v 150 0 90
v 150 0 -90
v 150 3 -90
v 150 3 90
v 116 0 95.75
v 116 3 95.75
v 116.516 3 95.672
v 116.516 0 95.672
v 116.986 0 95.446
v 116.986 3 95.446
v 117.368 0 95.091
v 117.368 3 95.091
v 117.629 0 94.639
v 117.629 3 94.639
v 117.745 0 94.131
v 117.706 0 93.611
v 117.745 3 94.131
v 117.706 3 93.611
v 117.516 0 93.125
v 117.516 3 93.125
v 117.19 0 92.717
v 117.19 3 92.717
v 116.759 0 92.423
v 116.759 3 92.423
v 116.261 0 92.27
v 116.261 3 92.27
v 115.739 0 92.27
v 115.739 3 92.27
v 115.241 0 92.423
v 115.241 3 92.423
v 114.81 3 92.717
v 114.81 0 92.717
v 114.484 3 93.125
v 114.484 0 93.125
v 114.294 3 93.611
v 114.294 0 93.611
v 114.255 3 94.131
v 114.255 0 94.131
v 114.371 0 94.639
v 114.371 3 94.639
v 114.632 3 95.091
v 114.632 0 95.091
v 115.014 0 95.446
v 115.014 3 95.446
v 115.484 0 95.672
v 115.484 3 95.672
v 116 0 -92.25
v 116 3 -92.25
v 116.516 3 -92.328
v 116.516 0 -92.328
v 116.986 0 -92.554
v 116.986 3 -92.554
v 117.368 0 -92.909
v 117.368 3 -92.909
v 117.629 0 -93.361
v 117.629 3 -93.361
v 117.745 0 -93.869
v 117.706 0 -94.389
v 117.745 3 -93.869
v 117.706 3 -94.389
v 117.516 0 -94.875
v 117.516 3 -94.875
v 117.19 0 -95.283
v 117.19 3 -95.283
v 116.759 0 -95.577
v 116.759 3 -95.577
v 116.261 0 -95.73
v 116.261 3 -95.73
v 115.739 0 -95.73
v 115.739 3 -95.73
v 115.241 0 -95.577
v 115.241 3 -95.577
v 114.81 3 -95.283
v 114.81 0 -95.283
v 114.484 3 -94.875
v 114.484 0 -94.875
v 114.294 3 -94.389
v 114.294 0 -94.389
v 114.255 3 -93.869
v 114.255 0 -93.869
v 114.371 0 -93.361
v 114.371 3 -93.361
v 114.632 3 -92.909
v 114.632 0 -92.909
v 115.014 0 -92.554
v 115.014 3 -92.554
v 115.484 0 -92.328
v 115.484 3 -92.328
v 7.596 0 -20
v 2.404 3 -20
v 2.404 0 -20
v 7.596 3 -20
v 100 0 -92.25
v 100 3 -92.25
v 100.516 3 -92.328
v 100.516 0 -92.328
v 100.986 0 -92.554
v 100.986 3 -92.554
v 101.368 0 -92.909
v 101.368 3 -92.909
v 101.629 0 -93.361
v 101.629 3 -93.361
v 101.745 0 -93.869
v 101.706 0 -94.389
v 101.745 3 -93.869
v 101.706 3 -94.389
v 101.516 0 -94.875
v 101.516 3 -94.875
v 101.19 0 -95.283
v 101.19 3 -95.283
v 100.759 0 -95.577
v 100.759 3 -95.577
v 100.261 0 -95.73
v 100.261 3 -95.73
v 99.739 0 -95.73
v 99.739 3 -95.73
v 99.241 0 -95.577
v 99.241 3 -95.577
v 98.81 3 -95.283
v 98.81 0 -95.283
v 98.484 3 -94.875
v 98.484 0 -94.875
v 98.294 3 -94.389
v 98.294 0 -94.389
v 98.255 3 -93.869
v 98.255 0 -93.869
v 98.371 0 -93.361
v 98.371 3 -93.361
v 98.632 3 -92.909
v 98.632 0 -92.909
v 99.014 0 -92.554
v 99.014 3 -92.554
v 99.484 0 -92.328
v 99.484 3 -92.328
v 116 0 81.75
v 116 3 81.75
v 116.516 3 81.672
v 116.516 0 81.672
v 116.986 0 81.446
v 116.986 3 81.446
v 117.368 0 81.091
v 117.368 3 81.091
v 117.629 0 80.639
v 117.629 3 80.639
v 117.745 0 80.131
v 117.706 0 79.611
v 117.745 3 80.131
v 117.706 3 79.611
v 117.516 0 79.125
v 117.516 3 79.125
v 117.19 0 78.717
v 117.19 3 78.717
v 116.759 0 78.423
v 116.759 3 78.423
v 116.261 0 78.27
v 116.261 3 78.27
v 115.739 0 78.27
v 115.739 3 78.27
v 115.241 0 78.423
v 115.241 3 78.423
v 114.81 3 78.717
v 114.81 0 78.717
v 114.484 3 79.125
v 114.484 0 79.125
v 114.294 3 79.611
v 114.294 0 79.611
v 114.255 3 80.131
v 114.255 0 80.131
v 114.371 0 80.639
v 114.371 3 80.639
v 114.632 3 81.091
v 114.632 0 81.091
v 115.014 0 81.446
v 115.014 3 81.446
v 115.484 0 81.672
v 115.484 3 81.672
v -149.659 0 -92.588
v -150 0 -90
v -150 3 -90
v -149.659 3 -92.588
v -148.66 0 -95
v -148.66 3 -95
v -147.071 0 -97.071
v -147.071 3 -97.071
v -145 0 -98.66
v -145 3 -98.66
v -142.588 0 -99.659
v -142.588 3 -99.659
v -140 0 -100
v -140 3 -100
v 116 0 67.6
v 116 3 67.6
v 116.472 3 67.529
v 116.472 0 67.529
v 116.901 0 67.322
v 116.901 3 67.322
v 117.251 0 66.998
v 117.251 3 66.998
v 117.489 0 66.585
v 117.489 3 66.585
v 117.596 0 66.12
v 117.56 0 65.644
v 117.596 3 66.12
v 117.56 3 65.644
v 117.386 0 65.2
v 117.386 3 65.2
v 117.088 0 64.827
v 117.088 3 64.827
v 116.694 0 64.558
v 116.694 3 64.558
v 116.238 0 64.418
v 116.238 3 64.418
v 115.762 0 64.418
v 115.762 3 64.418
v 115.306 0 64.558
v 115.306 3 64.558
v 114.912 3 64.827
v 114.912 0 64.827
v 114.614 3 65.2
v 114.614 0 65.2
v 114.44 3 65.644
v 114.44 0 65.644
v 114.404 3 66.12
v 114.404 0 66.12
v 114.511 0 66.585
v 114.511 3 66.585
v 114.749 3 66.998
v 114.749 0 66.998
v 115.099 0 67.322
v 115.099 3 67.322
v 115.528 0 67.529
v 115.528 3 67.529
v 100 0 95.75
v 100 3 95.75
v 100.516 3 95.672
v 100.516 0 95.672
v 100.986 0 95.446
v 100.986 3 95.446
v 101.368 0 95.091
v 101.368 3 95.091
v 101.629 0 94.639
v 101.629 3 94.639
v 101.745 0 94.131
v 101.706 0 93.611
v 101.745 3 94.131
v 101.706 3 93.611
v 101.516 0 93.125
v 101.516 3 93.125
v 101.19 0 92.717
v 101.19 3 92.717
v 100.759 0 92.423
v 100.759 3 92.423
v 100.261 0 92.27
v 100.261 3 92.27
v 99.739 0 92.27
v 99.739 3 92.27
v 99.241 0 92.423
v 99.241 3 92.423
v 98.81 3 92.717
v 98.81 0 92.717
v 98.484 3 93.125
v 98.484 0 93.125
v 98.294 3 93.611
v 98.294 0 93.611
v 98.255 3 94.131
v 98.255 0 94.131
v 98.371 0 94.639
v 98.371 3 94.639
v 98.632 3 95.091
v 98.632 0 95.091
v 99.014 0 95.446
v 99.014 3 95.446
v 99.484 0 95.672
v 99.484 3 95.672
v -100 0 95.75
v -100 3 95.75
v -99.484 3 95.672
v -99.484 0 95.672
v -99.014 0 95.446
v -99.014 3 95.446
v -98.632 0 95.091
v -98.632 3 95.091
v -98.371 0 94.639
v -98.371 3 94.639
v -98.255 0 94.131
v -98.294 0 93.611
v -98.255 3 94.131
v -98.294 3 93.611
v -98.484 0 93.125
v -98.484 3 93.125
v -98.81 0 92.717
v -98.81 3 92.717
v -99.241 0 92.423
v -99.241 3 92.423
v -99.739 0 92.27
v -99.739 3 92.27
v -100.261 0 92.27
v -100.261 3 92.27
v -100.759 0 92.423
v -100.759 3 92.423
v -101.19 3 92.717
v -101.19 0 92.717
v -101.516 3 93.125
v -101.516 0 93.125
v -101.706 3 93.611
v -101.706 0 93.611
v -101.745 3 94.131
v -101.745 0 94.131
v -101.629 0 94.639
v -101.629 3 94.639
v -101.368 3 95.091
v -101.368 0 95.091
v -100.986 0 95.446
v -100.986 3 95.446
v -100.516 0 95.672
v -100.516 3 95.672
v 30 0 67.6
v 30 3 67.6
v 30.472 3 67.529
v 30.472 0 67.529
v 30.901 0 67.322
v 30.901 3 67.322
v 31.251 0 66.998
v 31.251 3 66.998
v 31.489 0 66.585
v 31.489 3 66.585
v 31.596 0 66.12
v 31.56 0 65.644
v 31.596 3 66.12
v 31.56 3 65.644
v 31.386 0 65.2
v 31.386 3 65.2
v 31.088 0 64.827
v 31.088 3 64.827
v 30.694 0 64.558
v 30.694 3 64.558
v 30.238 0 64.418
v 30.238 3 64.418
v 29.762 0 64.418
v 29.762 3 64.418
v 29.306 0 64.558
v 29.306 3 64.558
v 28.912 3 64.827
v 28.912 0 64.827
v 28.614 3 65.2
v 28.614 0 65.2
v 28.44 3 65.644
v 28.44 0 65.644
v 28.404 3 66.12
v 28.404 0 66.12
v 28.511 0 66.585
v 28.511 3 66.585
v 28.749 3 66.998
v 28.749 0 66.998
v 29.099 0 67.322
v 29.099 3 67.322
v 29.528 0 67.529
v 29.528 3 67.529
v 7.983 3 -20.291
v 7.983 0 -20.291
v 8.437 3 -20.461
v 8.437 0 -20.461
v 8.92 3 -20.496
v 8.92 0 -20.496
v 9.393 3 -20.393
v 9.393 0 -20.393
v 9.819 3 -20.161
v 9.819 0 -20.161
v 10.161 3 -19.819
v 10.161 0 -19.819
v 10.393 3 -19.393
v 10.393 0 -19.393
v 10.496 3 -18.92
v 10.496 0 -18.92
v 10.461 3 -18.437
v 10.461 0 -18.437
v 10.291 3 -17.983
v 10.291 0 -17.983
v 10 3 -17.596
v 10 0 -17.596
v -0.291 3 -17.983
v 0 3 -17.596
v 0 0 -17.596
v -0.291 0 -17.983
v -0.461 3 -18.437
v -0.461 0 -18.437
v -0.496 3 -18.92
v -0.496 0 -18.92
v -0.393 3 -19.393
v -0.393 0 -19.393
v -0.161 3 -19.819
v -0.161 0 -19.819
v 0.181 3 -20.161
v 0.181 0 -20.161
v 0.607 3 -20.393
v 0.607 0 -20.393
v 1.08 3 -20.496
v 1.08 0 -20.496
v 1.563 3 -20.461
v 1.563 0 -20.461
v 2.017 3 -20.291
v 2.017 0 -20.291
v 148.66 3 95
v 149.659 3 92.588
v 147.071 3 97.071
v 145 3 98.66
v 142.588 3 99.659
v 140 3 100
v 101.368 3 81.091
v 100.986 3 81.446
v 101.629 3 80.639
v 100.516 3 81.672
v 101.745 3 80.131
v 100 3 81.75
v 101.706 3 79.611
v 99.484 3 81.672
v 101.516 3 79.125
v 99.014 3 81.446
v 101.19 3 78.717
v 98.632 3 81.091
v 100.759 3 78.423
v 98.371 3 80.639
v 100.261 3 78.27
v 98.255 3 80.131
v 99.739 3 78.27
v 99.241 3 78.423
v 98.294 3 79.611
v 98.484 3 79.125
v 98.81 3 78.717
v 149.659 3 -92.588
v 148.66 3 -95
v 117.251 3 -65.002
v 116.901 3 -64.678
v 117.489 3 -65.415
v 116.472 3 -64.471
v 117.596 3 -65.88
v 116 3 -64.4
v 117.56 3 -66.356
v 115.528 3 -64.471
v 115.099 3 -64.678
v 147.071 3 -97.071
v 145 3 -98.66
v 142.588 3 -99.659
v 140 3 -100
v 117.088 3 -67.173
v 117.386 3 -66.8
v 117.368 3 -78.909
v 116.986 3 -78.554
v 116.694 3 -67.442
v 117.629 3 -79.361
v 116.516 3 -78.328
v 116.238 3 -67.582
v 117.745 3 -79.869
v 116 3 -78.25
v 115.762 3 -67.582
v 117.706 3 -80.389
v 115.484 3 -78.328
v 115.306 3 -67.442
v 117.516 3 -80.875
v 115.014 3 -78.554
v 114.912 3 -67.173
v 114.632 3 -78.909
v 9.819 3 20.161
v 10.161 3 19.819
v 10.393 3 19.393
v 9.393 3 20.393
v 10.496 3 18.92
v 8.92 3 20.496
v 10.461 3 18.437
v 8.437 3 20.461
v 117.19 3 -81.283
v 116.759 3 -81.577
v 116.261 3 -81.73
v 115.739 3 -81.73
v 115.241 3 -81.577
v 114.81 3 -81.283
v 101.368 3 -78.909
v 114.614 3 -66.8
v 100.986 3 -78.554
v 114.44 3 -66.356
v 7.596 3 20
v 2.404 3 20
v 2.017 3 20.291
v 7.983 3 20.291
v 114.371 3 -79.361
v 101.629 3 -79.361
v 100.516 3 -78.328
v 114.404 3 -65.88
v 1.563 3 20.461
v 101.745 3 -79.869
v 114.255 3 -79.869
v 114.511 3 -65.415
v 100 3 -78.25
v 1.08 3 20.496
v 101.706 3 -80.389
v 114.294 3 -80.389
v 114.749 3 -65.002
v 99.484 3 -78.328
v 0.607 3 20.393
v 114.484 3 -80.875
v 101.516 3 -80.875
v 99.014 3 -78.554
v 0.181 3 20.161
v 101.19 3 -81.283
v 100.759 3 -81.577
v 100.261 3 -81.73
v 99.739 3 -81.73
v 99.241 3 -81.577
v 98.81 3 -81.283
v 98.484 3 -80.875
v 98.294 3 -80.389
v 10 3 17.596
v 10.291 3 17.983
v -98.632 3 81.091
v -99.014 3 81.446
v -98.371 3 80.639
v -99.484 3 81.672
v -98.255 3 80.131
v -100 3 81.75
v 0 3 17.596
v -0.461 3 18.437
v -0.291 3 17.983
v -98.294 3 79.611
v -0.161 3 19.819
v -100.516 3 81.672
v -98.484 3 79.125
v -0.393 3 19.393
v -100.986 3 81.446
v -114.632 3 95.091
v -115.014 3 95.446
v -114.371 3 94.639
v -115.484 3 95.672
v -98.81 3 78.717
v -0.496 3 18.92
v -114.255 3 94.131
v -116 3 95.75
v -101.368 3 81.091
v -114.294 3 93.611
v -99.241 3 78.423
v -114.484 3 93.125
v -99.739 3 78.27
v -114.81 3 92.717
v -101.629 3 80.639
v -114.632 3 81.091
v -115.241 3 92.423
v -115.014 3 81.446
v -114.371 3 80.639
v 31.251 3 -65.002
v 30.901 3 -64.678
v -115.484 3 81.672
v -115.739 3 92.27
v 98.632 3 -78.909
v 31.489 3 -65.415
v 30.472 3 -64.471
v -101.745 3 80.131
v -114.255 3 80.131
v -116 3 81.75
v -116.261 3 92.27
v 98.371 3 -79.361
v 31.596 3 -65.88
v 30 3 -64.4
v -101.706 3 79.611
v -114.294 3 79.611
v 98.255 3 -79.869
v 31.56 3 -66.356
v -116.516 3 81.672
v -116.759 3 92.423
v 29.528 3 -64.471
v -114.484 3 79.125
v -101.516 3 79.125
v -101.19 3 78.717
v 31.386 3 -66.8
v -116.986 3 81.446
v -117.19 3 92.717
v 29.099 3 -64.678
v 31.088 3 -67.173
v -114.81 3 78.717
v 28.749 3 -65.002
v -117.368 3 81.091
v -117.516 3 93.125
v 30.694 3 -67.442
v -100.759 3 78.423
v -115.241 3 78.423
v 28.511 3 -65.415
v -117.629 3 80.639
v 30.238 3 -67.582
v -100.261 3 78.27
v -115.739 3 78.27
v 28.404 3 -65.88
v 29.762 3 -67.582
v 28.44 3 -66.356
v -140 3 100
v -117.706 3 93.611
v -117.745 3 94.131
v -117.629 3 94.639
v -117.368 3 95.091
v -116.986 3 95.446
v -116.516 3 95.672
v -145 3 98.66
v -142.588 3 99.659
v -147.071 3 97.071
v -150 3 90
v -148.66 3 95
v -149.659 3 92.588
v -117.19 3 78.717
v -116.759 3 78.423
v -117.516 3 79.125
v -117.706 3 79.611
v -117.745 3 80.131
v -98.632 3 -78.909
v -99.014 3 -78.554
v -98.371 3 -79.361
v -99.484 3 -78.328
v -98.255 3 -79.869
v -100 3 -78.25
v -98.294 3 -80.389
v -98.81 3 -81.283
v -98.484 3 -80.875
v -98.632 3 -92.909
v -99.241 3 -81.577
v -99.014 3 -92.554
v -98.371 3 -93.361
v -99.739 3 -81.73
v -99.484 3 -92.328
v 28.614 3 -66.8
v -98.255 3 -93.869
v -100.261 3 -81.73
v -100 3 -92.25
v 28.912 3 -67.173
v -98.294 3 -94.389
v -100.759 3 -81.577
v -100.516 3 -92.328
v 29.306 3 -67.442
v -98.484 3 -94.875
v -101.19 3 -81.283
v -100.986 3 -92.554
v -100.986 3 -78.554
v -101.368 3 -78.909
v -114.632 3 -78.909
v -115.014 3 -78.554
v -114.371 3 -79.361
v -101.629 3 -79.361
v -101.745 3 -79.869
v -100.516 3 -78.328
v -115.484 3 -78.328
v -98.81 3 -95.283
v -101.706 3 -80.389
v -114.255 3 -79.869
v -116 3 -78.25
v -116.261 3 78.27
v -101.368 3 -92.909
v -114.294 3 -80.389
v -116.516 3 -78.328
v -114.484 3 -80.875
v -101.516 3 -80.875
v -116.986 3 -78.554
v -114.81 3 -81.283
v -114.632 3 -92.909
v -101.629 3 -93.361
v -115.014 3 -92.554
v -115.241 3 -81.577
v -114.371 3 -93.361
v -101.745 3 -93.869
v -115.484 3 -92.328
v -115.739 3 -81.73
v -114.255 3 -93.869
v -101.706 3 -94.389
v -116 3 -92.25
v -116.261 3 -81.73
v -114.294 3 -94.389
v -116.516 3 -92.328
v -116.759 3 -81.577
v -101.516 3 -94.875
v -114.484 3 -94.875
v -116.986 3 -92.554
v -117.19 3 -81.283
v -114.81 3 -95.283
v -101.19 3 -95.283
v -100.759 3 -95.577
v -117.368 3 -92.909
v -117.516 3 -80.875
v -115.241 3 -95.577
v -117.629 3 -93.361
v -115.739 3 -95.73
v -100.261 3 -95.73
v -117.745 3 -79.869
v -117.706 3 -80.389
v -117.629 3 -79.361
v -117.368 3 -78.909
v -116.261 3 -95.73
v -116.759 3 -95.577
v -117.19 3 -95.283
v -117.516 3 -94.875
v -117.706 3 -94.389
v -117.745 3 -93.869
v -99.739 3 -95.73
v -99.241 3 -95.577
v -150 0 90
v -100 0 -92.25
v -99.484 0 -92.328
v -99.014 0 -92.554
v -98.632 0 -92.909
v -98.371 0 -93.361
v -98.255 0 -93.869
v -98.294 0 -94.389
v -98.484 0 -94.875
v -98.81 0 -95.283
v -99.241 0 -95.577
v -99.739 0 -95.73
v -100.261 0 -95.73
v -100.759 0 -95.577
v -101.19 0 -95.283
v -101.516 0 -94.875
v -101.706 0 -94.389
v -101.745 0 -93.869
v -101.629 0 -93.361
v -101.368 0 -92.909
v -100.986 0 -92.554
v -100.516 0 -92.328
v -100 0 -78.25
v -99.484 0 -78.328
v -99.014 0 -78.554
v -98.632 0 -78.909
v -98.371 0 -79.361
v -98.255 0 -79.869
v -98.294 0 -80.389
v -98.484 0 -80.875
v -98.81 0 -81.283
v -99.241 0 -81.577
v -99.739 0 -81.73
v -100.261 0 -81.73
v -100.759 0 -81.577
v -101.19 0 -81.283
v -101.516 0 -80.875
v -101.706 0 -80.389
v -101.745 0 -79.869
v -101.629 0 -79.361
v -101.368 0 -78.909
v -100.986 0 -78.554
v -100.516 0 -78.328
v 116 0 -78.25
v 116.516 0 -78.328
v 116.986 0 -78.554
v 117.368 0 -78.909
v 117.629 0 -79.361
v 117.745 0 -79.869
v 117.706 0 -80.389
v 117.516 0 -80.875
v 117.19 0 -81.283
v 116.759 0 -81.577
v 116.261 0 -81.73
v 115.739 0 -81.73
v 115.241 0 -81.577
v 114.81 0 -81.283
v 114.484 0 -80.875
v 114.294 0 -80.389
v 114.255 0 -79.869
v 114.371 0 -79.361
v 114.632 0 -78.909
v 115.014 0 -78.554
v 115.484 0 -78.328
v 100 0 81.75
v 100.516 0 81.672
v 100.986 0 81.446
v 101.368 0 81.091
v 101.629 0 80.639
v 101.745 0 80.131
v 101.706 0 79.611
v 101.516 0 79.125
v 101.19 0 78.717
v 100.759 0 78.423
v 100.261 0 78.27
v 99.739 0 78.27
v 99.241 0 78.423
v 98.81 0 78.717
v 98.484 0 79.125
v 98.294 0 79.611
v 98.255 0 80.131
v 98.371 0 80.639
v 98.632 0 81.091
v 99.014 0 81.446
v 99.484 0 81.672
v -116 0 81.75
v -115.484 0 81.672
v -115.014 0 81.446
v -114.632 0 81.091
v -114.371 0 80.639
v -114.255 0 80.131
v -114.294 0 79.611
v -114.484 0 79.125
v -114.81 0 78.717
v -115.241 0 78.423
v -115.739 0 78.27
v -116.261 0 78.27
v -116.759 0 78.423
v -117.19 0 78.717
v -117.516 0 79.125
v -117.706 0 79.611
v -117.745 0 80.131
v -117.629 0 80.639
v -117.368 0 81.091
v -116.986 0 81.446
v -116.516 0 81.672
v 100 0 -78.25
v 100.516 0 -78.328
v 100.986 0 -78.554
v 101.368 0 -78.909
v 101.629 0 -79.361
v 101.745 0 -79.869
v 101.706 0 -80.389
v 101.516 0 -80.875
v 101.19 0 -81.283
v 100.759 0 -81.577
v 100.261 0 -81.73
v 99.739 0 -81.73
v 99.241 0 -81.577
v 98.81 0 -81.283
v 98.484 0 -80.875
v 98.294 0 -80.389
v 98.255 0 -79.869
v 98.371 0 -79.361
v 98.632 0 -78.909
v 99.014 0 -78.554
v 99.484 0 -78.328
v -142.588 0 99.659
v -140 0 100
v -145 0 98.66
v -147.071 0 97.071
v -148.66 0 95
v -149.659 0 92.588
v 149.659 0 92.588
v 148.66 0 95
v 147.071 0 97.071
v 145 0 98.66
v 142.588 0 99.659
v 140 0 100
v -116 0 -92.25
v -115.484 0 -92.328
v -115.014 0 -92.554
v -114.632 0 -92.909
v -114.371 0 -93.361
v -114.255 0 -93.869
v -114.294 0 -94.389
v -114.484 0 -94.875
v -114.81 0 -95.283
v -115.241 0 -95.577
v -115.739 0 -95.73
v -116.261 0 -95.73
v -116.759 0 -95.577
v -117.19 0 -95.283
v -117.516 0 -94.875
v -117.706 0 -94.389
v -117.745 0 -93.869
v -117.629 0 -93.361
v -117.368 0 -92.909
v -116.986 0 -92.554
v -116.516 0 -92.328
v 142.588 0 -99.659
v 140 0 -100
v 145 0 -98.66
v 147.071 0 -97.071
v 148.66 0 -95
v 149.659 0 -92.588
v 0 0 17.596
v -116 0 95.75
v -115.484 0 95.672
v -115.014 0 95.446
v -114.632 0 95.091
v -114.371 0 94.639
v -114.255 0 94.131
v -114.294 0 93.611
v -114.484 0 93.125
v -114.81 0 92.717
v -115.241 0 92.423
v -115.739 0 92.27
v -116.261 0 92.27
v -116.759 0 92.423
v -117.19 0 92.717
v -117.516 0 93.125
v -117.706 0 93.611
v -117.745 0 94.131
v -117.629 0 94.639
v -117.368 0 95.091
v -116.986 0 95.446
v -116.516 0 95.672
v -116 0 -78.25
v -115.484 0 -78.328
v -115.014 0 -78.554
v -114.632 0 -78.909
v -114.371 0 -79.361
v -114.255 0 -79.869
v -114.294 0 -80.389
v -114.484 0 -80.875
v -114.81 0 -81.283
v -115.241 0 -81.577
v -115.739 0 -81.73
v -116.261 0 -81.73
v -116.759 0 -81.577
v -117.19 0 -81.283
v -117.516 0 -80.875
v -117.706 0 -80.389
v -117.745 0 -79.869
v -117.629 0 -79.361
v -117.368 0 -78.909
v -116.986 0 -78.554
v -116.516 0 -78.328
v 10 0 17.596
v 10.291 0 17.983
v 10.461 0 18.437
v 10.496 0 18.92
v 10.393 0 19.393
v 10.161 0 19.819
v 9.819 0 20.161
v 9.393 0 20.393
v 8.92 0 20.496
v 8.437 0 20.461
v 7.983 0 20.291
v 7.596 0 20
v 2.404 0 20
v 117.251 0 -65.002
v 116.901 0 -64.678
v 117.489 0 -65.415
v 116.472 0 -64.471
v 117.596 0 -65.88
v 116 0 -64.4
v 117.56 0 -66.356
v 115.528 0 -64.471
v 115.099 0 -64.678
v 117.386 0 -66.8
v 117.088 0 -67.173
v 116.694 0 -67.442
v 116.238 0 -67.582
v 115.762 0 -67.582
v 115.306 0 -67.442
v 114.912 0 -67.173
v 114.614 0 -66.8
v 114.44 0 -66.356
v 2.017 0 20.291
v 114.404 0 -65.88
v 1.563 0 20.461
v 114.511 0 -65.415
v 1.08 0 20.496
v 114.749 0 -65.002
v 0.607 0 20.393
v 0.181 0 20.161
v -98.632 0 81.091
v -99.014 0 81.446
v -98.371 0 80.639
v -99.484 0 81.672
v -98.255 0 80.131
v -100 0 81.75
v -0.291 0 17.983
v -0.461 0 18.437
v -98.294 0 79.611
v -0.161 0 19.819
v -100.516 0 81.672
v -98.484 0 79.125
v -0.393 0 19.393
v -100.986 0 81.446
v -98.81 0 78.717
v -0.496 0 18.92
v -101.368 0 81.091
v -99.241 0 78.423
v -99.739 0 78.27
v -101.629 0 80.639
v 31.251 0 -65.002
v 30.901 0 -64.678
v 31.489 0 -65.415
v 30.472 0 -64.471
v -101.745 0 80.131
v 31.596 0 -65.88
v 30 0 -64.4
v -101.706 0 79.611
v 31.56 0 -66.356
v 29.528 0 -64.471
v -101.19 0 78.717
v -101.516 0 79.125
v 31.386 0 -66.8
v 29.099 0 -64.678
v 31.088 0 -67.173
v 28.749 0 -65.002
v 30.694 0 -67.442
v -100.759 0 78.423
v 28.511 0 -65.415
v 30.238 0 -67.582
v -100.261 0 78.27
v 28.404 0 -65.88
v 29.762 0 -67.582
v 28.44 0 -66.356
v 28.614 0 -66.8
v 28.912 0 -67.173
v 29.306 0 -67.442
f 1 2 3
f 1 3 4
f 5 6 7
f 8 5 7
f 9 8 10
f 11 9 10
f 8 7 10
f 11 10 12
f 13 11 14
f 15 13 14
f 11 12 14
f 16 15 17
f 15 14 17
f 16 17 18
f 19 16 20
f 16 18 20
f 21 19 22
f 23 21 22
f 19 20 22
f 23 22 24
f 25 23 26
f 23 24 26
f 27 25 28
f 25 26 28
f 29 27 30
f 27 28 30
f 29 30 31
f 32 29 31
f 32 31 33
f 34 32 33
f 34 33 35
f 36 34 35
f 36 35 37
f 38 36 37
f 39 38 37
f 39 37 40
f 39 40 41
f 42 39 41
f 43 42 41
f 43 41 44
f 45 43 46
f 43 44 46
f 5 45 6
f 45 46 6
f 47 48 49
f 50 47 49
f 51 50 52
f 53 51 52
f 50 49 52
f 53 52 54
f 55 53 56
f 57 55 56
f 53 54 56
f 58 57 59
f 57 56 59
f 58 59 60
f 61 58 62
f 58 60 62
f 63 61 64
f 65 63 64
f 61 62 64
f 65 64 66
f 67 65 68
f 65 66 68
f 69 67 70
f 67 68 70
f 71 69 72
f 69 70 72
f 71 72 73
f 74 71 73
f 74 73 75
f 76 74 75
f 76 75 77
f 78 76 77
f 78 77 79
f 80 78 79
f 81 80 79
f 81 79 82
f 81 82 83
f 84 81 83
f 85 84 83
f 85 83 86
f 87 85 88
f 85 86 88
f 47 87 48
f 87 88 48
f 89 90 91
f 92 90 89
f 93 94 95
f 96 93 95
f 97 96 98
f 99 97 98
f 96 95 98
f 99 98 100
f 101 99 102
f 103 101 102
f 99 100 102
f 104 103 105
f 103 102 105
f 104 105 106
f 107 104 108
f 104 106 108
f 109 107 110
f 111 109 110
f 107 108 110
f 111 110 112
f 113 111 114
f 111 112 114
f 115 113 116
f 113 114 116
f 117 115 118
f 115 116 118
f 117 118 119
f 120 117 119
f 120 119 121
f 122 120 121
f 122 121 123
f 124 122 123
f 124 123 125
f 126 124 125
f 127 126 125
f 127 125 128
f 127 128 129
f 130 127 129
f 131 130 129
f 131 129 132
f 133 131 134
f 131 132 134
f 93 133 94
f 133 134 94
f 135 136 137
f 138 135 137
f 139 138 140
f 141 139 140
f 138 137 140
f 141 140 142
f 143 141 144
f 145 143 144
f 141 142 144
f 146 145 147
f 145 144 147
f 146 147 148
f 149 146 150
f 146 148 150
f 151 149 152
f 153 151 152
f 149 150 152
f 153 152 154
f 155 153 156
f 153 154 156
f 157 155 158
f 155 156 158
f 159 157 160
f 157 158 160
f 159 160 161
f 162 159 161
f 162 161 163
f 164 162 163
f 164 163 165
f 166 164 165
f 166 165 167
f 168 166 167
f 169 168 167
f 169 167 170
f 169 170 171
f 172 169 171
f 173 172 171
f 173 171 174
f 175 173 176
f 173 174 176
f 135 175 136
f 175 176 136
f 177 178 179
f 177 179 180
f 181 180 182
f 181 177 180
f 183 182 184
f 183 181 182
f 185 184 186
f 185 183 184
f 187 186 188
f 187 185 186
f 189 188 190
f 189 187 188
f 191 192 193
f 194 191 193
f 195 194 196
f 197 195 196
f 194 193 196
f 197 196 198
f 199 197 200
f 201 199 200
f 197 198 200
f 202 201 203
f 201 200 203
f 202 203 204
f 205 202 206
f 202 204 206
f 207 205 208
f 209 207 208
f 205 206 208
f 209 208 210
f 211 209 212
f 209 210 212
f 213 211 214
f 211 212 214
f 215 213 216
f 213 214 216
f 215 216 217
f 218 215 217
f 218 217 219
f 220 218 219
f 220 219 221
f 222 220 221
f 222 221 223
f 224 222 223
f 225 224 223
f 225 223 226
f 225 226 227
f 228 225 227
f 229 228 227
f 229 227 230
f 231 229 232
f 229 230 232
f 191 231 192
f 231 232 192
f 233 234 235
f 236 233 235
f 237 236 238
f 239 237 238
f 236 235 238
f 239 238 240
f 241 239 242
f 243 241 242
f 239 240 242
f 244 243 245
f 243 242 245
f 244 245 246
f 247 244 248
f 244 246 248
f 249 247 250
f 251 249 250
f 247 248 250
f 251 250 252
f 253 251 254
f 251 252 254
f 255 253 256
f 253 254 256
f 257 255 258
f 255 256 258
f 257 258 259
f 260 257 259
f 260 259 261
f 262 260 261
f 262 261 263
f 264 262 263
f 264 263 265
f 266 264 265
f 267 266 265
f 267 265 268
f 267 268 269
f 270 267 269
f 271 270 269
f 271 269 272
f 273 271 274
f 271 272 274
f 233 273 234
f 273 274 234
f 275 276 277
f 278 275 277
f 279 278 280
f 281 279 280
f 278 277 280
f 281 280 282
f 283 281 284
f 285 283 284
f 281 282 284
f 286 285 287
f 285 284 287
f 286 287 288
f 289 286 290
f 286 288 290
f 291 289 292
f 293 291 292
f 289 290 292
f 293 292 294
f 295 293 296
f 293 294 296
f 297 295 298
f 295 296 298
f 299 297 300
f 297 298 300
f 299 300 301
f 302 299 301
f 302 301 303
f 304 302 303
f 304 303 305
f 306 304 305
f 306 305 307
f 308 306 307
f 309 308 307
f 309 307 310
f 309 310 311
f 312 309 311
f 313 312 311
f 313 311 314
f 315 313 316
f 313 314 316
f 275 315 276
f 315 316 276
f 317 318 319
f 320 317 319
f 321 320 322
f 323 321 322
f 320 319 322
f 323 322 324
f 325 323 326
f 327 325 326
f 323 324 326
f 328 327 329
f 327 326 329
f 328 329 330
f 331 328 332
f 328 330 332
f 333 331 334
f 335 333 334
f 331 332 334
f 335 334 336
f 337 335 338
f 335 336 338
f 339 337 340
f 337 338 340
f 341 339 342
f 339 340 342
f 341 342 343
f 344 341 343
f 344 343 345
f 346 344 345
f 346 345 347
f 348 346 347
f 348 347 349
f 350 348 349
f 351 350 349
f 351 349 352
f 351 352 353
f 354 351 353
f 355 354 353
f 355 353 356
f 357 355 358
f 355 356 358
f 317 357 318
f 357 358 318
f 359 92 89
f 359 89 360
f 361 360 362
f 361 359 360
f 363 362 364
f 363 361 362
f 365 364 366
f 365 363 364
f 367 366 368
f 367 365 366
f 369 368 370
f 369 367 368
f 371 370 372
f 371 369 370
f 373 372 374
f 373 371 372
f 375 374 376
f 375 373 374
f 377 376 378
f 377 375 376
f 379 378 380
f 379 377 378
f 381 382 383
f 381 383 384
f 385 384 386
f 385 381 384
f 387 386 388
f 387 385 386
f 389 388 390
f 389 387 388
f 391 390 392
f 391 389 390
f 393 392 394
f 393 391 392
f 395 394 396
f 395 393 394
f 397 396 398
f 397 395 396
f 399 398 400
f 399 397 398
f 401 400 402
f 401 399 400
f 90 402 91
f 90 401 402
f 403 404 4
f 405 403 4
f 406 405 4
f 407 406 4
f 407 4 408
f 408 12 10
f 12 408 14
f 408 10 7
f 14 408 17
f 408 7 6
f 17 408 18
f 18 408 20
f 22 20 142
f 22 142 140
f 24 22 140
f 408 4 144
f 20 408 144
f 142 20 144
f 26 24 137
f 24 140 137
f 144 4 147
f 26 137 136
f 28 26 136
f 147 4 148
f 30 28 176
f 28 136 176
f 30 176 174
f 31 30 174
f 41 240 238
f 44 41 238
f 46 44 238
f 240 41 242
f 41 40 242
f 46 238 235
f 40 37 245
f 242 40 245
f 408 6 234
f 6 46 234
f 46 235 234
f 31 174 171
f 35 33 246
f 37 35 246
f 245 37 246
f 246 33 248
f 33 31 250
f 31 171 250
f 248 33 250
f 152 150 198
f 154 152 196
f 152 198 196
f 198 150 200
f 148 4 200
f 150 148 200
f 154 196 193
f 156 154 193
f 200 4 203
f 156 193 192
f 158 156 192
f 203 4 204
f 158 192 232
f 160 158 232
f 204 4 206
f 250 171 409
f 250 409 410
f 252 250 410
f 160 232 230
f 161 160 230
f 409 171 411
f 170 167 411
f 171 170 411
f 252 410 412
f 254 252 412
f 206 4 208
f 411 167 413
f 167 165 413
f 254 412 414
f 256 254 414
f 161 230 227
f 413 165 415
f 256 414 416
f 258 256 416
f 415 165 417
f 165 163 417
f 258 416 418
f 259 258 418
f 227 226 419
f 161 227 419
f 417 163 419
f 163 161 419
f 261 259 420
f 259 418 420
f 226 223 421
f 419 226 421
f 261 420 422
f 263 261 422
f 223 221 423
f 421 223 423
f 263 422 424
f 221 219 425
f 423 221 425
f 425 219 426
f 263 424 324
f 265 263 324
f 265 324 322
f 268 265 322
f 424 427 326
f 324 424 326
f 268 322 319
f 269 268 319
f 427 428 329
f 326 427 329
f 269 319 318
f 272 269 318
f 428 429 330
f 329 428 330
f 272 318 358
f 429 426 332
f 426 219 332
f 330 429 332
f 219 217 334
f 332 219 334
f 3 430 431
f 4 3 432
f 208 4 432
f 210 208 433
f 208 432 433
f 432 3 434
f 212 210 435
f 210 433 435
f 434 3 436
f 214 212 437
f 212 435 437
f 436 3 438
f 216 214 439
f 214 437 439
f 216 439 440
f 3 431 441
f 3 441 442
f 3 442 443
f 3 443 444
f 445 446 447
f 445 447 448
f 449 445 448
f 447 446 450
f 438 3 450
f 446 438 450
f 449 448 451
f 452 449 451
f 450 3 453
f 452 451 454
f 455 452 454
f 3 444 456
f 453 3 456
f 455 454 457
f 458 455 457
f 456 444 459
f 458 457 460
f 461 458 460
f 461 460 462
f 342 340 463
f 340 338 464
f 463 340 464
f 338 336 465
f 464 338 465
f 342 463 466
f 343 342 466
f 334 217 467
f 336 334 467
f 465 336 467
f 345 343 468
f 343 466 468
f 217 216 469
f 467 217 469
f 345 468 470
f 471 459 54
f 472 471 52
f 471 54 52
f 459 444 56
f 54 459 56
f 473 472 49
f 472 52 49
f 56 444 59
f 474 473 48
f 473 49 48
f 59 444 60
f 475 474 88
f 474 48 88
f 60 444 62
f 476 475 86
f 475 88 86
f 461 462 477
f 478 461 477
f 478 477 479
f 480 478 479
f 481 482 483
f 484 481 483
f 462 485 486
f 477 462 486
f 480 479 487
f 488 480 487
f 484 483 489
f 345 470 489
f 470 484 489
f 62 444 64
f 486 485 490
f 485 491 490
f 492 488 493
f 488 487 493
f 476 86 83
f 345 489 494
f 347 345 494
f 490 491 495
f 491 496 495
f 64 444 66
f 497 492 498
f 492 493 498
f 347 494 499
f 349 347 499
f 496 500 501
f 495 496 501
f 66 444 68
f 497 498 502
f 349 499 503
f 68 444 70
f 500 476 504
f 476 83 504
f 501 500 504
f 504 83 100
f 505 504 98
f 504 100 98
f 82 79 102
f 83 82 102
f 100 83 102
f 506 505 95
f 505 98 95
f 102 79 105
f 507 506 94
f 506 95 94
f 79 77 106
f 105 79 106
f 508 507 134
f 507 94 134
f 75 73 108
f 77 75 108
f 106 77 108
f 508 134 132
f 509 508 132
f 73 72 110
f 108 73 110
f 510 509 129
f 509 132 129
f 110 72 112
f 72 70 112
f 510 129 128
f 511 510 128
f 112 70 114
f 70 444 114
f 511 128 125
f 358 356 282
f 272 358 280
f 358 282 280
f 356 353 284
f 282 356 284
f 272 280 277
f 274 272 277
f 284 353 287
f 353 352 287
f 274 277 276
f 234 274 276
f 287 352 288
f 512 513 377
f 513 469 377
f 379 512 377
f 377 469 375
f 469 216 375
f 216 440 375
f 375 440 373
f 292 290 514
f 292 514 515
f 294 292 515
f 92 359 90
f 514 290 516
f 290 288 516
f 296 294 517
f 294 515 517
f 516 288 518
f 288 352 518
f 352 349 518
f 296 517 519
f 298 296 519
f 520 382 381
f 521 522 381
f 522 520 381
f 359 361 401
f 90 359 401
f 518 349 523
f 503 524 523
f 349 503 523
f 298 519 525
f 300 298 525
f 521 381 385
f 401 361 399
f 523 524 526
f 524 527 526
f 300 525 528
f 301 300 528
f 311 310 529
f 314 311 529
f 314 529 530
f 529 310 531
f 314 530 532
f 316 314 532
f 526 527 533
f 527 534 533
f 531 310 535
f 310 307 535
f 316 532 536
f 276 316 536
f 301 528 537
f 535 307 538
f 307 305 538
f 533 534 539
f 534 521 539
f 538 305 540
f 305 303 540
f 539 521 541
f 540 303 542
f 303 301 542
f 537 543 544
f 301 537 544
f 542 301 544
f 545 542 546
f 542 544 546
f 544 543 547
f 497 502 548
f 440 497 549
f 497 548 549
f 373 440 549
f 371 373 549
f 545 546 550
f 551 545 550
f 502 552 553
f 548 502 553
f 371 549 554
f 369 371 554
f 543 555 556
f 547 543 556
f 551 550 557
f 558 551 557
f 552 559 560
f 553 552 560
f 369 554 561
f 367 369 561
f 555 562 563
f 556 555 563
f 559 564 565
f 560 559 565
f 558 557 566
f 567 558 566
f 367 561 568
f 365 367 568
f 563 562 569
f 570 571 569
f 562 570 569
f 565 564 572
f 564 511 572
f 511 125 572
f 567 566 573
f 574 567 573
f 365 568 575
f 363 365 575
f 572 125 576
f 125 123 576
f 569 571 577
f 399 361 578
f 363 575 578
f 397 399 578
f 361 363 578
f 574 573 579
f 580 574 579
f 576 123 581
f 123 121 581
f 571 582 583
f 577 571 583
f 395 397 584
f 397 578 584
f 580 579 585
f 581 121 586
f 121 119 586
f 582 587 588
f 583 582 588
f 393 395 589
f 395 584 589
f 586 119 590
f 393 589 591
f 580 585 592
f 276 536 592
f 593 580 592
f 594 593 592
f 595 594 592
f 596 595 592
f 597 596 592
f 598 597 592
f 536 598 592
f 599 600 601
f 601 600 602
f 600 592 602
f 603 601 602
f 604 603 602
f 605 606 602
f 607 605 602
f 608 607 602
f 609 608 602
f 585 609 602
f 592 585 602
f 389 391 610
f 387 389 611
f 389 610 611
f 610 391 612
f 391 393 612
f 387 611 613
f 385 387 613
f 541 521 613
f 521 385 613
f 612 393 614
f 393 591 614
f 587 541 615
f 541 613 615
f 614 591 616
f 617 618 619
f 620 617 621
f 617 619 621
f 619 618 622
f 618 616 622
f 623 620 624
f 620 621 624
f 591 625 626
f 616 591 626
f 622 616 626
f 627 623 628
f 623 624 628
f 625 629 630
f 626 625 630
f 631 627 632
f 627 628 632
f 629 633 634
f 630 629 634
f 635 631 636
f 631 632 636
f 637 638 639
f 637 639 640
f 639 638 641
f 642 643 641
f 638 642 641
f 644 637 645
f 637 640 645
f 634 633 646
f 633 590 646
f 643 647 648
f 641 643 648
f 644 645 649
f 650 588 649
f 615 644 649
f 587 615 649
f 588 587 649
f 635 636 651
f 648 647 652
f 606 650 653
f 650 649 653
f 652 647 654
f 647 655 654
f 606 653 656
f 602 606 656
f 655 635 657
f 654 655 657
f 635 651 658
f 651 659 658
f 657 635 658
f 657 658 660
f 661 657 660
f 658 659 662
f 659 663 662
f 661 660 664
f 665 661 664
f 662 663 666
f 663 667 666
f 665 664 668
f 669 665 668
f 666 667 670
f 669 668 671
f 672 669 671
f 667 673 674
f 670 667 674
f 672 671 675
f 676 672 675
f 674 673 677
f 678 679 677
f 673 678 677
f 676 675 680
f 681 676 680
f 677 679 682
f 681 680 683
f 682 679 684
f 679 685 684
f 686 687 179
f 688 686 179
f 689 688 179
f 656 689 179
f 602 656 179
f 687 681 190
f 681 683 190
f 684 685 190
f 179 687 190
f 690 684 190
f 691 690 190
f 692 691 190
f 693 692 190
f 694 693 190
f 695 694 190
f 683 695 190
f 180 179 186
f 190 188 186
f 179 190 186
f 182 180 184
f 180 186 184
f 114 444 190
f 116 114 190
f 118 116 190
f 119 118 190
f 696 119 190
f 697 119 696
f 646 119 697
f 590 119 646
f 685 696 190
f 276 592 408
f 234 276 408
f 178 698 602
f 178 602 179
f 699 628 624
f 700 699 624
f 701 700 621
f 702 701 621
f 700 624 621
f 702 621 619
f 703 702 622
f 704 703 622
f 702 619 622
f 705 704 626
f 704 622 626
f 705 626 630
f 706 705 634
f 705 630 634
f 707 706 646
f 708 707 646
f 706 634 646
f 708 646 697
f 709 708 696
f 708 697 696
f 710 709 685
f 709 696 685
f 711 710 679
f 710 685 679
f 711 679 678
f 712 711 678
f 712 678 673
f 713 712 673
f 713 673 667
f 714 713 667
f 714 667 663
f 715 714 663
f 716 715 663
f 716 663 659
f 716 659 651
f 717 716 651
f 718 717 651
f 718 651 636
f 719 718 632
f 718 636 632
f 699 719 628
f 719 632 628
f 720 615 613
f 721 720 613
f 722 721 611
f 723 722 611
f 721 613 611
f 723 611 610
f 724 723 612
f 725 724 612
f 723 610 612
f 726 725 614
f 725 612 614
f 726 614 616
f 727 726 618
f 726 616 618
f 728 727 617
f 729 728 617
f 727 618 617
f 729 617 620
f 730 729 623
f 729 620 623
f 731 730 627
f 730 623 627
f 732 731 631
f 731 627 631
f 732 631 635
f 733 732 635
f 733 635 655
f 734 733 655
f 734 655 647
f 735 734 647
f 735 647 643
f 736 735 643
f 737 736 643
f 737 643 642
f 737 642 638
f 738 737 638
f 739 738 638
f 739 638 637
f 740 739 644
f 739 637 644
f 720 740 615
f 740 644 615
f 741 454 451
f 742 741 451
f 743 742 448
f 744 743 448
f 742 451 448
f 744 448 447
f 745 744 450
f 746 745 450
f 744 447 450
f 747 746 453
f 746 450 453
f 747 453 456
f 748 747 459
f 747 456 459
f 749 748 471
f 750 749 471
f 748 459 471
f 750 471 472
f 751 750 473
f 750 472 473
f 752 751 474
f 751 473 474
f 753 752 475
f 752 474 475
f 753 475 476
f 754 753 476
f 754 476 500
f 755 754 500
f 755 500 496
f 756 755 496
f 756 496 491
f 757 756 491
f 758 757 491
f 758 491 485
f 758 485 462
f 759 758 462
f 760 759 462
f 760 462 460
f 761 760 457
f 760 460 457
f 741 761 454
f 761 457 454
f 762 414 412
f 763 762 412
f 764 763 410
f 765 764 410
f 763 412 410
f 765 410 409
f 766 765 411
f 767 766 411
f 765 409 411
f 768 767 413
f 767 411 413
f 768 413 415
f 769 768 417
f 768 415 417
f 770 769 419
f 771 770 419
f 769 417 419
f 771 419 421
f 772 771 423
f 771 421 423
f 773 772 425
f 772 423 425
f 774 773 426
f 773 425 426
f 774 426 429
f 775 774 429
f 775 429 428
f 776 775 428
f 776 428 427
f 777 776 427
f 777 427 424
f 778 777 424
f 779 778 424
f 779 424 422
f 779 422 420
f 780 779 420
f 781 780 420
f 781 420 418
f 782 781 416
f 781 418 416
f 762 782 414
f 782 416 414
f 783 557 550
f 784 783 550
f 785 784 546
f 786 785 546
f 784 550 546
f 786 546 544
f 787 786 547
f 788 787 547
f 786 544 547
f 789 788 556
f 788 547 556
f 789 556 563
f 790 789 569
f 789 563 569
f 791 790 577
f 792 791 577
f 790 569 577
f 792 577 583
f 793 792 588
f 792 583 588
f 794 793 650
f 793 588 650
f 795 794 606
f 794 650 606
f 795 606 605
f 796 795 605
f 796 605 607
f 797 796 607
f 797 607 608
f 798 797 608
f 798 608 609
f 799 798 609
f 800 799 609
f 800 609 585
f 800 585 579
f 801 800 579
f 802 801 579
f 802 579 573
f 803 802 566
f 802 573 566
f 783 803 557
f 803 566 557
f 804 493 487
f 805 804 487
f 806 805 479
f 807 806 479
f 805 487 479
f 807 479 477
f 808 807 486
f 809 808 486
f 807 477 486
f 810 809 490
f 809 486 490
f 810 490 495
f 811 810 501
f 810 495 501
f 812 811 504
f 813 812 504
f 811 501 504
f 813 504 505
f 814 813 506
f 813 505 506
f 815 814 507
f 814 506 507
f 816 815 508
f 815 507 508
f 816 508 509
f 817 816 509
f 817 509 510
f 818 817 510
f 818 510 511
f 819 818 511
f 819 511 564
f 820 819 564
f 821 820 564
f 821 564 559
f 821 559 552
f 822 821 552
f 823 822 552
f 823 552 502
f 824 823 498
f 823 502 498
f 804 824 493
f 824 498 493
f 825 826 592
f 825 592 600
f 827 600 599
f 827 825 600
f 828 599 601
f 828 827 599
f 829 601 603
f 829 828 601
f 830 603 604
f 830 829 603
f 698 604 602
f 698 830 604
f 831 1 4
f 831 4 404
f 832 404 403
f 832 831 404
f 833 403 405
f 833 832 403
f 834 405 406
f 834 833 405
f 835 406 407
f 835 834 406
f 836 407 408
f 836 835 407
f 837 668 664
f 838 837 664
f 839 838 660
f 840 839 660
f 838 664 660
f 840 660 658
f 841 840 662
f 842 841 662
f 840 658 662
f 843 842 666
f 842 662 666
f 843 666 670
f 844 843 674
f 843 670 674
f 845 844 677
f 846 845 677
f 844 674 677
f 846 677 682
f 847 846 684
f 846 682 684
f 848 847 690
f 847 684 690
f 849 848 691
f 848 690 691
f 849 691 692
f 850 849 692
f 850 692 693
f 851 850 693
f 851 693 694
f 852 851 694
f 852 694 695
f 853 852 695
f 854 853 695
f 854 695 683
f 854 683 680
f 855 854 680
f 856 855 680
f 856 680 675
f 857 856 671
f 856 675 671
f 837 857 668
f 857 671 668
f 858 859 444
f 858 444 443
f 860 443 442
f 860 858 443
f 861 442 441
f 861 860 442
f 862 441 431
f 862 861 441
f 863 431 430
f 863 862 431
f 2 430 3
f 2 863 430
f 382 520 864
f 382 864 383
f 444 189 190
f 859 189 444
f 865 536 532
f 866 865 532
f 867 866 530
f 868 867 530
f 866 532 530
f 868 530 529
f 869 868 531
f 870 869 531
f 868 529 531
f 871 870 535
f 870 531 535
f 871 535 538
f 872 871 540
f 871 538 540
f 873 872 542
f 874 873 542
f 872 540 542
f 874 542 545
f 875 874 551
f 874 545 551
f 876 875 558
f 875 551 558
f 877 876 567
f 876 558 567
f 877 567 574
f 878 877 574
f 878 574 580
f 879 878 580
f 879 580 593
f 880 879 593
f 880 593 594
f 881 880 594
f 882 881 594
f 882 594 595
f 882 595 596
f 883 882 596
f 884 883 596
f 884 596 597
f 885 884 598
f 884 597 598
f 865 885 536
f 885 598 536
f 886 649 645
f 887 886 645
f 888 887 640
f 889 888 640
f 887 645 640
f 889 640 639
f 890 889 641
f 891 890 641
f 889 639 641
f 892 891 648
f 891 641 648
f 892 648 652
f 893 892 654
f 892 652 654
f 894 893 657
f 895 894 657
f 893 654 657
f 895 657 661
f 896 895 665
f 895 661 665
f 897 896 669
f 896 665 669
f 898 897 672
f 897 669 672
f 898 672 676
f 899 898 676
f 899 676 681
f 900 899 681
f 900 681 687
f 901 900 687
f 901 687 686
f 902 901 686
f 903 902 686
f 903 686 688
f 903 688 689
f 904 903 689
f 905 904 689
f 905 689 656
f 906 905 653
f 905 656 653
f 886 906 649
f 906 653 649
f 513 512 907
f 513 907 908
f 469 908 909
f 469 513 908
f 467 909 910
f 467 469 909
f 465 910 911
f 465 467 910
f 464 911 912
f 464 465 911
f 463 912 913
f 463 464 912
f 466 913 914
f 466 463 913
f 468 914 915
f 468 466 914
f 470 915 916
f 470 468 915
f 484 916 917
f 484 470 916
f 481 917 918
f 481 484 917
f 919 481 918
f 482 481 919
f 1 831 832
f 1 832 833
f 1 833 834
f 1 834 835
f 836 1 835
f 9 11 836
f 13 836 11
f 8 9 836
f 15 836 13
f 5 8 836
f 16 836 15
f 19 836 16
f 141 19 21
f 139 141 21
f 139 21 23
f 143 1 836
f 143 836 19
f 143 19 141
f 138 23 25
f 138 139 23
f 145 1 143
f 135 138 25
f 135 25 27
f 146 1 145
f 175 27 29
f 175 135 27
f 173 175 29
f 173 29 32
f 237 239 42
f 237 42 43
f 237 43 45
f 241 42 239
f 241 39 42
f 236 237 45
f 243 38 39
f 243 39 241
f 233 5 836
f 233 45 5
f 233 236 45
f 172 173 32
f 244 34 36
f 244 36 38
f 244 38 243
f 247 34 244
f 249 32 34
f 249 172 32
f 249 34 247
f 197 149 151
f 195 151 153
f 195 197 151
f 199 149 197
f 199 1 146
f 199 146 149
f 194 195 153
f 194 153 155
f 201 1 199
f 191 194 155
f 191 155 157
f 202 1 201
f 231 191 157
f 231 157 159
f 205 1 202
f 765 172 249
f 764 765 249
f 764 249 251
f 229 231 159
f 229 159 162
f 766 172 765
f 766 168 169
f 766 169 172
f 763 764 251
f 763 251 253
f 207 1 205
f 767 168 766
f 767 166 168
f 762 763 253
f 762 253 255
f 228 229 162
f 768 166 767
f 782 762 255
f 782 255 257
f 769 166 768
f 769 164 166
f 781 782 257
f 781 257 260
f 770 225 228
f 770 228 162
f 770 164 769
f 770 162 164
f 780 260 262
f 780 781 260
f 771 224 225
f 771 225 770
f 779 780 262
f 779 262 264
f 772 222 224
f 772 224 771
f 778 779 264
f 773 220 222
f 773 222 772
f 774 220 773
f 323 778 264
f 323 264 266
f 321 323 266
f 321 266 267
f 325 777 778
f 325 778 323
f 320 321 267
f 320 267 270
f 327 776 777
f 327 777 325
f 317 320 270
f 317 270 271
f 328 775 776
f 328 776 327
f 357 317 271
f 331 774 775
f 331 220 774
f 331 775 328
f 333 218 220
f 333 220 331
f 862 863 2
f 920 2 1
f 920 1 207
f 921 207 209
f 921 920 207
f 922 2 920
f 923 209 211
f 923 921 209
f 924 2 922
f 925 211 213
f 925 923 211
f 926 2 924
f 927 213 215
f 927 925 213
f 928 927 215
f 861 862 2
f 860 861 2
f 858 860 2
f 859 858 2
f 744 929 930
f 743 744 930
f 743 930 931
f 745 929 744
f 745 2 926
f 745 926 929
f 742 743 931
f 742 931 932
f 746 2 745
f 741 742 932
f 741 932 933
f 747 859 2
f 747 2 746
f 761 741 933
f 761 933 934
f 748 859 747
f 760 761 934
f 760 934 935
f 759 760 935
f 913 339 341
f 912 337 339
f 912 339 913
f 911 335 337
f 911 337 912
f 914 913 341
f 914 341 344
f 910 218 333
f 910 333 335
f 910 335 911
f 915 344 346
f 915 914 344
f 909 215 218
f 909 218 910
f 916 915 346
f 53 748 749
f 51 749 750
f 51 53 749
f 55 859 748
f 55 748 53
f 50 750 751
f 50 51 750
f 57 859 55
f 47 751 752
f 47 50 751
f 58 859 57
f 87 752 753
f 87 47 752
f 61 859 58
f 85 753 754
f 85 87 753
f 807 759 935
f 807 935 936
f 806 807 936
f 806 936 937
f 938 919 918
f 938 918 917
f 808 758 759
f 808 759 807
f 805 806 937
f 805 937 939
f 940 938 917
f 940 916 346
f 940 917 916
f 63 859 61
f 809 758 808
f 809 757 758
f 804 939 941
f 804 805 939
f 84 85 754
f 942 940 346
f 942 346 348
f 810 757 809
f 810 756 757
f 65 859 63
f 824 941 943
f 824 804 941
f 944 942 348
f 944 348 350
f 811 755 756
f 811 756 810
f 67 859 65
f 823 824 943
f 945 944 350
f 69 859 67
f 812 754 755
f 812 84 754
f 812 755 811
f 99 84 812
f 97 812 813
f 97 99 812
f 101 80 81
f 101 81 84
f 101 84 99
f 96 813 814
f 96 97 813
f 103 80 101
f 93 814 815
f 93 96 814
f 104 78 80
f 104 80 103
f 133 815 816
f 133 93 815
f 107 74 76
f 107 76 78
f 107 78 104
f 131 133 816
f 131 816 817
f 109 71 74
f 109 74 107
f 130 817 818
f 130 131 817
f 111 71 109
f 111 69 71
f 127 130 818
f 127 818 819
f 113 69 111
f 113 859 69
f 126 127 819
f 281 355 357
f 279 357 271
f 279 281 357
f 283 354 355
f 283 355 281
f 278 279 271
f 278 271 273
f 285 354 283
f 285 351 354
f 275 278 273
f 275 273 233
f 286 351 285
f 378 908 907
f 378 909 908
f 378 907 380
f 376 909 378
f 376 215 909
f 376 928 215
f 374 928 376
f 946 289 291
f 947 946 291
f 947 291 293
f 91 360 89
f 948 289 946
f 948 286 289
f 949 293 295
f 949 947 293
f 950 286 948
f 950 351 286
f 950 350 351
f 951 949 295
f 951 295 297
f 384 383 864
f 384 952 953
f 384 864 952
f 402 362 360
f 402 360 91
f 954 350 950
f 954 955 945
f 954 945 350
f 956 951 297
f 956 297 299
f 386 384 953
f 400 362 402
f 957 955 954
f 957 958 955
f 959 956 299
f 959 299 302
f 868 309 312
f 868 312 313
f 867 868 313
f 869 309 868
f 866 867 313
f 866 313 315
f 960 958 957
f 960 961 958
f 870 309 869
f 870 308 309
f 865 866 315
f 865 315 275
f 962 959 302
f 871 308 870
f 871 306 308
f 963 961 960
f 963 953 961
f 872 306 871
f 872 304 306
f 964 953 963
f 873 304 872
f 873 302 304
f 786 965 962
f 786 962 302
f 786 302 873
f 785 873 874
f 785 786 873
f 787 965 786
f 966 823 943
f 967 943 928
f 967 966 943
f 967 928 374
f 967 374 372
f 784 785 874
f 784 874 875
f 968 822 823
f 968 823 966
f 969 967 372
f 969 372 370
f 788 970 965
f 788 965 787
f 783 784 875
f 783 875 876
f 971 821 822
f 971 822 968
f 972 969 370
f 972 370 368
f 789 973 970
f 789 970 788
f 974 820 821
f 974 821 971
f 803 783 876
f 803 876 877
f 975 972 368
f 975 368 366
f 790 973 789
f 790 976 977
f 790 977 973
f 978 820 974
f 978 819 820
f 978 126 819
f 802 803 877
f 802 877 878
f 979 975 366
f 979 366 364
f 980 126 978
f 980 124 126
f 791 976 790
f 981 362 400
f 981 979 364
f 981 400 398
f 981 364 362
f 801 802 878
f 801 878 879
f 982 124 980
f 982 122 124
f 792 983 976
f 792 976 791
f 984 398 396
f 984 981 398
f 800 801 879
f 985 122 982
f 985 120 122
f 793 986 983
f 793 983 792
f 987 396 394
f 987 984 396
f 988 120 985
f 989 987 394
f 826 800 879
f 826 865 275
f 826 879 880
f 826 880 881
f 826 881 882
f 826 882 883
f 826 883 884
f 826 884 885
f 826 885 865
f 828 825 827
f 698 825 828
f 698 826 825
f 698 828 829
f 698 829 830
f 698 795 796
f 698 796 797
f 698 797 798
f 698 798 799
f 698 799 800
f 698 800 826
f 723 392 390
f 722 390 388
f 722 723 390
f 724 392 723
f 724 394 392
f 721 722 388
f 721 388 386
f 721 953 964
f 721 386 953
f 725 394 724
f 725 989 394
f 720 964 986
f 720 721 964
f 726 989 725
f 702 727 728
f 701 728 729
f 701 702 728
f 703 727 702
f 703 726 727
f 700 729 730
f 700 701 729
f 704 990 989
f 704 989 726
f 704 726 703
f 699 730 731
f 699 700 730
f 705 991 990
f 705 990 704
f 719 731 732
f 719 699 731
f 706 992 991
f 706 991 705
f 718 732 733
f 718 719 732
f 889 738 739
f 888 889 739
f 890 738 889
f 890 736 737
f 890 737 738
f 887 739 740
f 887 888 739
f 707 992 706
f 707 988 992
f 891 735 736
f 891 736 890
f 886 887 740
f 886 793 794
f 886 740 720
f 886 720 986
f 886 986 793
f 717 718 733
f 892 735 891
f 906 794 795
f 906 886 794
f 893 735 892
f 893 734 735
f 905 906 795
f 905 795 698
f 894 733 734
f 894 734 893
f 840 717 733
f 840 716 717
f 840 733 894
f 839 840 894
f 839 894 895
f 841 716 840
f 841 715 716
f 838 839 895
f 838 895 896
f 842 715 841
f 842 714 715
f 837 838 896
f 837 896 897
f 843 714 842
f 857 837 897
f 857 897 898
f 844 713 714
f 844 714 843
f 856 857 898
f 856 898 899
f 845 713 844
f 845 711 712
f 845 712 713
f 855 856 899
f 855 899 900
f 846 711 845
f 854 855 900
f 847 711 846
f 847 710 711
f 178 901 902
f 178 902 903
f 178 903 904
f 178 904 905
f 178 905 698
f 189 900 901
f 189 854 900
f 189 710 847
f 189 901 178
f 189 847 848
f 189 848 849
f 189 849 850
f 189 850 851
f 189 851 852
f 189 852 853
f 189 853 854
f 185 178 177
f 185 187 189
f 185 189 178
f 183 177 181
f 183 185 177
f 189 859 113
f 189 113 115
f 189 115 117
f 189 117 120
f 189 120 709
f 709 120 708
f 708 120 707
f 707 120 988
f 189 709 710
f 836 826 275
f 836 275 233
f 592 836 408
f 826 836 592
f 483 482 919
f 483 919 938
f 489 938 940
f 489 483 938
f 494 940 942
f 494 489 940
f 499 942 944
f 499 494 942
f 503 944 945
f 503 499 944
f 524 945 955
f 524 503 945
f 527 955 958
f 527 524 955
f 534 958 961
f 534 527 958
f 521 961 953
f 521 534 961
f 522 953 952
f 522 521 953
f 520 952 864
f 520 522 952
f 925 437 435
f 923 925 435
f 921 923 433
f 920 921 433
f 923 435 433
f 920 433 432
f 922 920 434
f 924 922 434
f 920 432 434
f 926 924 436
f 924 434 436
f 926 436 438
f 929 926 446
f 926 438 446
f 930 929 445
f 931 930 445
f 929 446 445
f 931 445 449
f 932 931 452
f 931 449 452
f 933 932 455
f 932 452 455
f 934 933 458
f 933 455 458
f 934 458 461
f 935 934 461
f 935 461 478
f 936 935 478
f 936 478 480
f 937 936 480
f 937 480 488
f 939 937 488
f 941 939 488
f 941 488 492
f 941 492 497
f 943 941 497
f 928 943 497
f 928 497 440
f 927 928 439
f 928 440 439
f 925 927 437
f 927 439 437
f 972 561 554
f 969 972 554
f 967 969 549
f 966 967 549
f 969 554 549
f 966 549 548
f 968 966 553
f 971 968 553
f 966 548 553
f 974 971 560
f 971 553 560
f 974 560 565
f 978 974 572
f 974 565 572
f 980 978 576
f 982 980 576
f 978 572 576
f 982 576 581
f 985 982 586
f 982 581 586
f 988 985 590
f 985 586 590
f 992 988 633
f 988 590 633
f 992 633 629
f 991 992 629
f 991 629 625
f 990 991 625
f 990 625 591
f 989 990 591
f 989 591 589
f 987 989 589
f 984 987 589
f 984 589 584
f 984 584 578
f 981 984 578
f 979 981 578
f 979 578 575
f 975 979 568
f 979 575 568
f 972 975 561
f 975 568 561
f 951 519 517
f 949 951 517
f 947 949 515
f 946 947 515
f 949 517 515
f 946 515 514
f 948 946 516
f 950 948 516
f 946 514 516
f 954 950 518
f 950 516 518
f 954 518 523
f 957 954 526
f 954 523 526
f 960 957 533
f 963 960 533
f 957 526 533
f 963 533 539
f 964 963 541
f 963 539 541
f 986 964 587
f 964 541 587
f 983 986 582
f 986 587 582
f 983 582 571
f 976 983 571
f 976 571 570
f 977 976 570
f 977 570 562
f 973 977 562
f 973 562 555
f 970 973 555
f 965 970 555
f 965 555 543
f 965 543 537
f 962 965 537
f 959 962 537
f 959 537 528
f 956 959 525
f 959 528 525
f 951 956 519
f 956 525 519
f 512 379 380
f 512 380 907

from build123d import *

# Parameters (mm, degrees)
EXTRUDE_1_DEPTH     = 3
SKETCH_15_R         = 1.75
SKETCH_15_R_2       = 1.6
CUT_EXTRUDE_7_DEPTH = 3


with BuildPart() as part:
    # 草图1 → 凸台-拉伸1 (new body)
    with BuildSketch(Plane(origin=(0, 0, 0), x_dir=(1, 0, 0), z_dir=(0, 1, 0))):
        with BuildLine():
            Line((-140, 100), (140, 100))
            ThreePointArc((140, 100), (147.071067812, 97.071067812), (150, 90))
            Line((150, 90), (150, -90))
            ThreePointArc((150, -90), (147.071067812, -97.071067812), (140, -100))
            Line((140, -100), (-140, -100))
            ThreePointArc((-140, -100), (-147.071067812, -97.071067812), (-150, -90))
            Line((-150, -90), (-150, 90))
            ThreePointArc((-150, 90), (-147.071067812, 97.071067812), (-140, 100))
        make_face()
    extrude(amount=EXTRUDE_1_DEPTH)

    # 草图15 → 切除-拉伸7 (cut)
    with BuildSketch(Plane(origin=(0, 3, 0), x_dir=(1, 0, 0), z_dir=(0, 1, 0))):
        with Locations(Location((-116, 94, 0), (0, 0, 270))):
            Circle(SKETCH_15_R)
        with Locations(Location((-100, 94, 0), (0, 0, 270))):
            Circle(SKETCH_15_R)
        with Locations(Location((-116, 80, 0), (0, 0, 270))):
            Circle(SKETCH_15_R)
        with Locations(Location((-100, 80, 0), (0, 0, 270))):
            Circle(SKETCH_15_R)
        with Locations(Location((-116, -80, 0), (0, 0, 270))):
            Circle(SKETCH_15_R)
        with Locations(Location((-100, -80, 0), (0, 0, 270))):
            Circle(SKETCH_15_R)
        with Locations(Location((-116, -94, 0), (0, 0, 270))):
            Circle(SKETCH_15_R)
        with Locations(Location((-100, -94, 0), (0, 0, 270))):
            Circle(SKETCH_15_R)
        with Locations(Location((100, -80, 0), (0, 0, 270))):
            Circle(SKETCH_15_R)
        with Locations(Location((116, -80, 0), (0, 0, 270))):
            Circle(SKETCH_15_R)
        with Locations(Location((100, -94, 0), (0, 0, 270))):
            Circle(SKETCH_15_R)
        with Locations(Location((100, 94, 0), (0, 0, 270))):
            Circle(SKETCH_15_R)
        with Locations(Location((116, 94, 0), (0, 0, 270))):
            Circle(SKETCH_15_R)
        with Locations(Location((100, 80, 0), (0, 0, 270))):
            Circle(SKETCH_15_R)
        with Locations(Location((116, 80, 0), (0, 0, 270))):
            Circle(SKETCH_15_R)
        with Locations(Location((116, -94, 0), (0, 0, 270))):
            Circle(SKETCH_15_R)
        with Locations(Location((30, 66, 0), (0, 0, 270))):
            Circle(SKETCH_15_R_2)
        with Locations(Location((116, 66, 0), (0, 0, 270))):
            Circle(SKETCH_15_R_2)
        with Locations(Location((30, -66, 0), (0, 0, 270))):
            Circle(SKETCH_15_R_2)
        with Locations(Location((116, -66, 0), (0, 0, 270))):
            Circle(SKETCH_15_R_2)
        with BuildLine():
            Line((2.404159458, 20), (7.595840542, 20))
            ThreePointArc((7.595840542, 20), (10.002081528, 20.002081528), (10, 17.595840542))
            Line((10, 17.595840542), (10, -17.595840542))
            ThreePointArc((10, -17.595840542), (10.002081528, -20.002081528), (7.595840542, -20))
            Line((7.595840542, -20), (2.404159458, -20))
            ThreePointArc((2.404159458, -20), (-0.002081528, -20.002081528), (0, -17.595840542))
            Line((0, -17.595840542), (0, 17.595840542))
            ThreePointArc((0, 17.595840542), (-0.002081528, 20.002081528), (2.404159458, 20))
        make_face()
    extrude(amount=-CUT_EXTRUDE_7_DEPTH, mode=Mode.SUBTRACT)


solid = part.part
